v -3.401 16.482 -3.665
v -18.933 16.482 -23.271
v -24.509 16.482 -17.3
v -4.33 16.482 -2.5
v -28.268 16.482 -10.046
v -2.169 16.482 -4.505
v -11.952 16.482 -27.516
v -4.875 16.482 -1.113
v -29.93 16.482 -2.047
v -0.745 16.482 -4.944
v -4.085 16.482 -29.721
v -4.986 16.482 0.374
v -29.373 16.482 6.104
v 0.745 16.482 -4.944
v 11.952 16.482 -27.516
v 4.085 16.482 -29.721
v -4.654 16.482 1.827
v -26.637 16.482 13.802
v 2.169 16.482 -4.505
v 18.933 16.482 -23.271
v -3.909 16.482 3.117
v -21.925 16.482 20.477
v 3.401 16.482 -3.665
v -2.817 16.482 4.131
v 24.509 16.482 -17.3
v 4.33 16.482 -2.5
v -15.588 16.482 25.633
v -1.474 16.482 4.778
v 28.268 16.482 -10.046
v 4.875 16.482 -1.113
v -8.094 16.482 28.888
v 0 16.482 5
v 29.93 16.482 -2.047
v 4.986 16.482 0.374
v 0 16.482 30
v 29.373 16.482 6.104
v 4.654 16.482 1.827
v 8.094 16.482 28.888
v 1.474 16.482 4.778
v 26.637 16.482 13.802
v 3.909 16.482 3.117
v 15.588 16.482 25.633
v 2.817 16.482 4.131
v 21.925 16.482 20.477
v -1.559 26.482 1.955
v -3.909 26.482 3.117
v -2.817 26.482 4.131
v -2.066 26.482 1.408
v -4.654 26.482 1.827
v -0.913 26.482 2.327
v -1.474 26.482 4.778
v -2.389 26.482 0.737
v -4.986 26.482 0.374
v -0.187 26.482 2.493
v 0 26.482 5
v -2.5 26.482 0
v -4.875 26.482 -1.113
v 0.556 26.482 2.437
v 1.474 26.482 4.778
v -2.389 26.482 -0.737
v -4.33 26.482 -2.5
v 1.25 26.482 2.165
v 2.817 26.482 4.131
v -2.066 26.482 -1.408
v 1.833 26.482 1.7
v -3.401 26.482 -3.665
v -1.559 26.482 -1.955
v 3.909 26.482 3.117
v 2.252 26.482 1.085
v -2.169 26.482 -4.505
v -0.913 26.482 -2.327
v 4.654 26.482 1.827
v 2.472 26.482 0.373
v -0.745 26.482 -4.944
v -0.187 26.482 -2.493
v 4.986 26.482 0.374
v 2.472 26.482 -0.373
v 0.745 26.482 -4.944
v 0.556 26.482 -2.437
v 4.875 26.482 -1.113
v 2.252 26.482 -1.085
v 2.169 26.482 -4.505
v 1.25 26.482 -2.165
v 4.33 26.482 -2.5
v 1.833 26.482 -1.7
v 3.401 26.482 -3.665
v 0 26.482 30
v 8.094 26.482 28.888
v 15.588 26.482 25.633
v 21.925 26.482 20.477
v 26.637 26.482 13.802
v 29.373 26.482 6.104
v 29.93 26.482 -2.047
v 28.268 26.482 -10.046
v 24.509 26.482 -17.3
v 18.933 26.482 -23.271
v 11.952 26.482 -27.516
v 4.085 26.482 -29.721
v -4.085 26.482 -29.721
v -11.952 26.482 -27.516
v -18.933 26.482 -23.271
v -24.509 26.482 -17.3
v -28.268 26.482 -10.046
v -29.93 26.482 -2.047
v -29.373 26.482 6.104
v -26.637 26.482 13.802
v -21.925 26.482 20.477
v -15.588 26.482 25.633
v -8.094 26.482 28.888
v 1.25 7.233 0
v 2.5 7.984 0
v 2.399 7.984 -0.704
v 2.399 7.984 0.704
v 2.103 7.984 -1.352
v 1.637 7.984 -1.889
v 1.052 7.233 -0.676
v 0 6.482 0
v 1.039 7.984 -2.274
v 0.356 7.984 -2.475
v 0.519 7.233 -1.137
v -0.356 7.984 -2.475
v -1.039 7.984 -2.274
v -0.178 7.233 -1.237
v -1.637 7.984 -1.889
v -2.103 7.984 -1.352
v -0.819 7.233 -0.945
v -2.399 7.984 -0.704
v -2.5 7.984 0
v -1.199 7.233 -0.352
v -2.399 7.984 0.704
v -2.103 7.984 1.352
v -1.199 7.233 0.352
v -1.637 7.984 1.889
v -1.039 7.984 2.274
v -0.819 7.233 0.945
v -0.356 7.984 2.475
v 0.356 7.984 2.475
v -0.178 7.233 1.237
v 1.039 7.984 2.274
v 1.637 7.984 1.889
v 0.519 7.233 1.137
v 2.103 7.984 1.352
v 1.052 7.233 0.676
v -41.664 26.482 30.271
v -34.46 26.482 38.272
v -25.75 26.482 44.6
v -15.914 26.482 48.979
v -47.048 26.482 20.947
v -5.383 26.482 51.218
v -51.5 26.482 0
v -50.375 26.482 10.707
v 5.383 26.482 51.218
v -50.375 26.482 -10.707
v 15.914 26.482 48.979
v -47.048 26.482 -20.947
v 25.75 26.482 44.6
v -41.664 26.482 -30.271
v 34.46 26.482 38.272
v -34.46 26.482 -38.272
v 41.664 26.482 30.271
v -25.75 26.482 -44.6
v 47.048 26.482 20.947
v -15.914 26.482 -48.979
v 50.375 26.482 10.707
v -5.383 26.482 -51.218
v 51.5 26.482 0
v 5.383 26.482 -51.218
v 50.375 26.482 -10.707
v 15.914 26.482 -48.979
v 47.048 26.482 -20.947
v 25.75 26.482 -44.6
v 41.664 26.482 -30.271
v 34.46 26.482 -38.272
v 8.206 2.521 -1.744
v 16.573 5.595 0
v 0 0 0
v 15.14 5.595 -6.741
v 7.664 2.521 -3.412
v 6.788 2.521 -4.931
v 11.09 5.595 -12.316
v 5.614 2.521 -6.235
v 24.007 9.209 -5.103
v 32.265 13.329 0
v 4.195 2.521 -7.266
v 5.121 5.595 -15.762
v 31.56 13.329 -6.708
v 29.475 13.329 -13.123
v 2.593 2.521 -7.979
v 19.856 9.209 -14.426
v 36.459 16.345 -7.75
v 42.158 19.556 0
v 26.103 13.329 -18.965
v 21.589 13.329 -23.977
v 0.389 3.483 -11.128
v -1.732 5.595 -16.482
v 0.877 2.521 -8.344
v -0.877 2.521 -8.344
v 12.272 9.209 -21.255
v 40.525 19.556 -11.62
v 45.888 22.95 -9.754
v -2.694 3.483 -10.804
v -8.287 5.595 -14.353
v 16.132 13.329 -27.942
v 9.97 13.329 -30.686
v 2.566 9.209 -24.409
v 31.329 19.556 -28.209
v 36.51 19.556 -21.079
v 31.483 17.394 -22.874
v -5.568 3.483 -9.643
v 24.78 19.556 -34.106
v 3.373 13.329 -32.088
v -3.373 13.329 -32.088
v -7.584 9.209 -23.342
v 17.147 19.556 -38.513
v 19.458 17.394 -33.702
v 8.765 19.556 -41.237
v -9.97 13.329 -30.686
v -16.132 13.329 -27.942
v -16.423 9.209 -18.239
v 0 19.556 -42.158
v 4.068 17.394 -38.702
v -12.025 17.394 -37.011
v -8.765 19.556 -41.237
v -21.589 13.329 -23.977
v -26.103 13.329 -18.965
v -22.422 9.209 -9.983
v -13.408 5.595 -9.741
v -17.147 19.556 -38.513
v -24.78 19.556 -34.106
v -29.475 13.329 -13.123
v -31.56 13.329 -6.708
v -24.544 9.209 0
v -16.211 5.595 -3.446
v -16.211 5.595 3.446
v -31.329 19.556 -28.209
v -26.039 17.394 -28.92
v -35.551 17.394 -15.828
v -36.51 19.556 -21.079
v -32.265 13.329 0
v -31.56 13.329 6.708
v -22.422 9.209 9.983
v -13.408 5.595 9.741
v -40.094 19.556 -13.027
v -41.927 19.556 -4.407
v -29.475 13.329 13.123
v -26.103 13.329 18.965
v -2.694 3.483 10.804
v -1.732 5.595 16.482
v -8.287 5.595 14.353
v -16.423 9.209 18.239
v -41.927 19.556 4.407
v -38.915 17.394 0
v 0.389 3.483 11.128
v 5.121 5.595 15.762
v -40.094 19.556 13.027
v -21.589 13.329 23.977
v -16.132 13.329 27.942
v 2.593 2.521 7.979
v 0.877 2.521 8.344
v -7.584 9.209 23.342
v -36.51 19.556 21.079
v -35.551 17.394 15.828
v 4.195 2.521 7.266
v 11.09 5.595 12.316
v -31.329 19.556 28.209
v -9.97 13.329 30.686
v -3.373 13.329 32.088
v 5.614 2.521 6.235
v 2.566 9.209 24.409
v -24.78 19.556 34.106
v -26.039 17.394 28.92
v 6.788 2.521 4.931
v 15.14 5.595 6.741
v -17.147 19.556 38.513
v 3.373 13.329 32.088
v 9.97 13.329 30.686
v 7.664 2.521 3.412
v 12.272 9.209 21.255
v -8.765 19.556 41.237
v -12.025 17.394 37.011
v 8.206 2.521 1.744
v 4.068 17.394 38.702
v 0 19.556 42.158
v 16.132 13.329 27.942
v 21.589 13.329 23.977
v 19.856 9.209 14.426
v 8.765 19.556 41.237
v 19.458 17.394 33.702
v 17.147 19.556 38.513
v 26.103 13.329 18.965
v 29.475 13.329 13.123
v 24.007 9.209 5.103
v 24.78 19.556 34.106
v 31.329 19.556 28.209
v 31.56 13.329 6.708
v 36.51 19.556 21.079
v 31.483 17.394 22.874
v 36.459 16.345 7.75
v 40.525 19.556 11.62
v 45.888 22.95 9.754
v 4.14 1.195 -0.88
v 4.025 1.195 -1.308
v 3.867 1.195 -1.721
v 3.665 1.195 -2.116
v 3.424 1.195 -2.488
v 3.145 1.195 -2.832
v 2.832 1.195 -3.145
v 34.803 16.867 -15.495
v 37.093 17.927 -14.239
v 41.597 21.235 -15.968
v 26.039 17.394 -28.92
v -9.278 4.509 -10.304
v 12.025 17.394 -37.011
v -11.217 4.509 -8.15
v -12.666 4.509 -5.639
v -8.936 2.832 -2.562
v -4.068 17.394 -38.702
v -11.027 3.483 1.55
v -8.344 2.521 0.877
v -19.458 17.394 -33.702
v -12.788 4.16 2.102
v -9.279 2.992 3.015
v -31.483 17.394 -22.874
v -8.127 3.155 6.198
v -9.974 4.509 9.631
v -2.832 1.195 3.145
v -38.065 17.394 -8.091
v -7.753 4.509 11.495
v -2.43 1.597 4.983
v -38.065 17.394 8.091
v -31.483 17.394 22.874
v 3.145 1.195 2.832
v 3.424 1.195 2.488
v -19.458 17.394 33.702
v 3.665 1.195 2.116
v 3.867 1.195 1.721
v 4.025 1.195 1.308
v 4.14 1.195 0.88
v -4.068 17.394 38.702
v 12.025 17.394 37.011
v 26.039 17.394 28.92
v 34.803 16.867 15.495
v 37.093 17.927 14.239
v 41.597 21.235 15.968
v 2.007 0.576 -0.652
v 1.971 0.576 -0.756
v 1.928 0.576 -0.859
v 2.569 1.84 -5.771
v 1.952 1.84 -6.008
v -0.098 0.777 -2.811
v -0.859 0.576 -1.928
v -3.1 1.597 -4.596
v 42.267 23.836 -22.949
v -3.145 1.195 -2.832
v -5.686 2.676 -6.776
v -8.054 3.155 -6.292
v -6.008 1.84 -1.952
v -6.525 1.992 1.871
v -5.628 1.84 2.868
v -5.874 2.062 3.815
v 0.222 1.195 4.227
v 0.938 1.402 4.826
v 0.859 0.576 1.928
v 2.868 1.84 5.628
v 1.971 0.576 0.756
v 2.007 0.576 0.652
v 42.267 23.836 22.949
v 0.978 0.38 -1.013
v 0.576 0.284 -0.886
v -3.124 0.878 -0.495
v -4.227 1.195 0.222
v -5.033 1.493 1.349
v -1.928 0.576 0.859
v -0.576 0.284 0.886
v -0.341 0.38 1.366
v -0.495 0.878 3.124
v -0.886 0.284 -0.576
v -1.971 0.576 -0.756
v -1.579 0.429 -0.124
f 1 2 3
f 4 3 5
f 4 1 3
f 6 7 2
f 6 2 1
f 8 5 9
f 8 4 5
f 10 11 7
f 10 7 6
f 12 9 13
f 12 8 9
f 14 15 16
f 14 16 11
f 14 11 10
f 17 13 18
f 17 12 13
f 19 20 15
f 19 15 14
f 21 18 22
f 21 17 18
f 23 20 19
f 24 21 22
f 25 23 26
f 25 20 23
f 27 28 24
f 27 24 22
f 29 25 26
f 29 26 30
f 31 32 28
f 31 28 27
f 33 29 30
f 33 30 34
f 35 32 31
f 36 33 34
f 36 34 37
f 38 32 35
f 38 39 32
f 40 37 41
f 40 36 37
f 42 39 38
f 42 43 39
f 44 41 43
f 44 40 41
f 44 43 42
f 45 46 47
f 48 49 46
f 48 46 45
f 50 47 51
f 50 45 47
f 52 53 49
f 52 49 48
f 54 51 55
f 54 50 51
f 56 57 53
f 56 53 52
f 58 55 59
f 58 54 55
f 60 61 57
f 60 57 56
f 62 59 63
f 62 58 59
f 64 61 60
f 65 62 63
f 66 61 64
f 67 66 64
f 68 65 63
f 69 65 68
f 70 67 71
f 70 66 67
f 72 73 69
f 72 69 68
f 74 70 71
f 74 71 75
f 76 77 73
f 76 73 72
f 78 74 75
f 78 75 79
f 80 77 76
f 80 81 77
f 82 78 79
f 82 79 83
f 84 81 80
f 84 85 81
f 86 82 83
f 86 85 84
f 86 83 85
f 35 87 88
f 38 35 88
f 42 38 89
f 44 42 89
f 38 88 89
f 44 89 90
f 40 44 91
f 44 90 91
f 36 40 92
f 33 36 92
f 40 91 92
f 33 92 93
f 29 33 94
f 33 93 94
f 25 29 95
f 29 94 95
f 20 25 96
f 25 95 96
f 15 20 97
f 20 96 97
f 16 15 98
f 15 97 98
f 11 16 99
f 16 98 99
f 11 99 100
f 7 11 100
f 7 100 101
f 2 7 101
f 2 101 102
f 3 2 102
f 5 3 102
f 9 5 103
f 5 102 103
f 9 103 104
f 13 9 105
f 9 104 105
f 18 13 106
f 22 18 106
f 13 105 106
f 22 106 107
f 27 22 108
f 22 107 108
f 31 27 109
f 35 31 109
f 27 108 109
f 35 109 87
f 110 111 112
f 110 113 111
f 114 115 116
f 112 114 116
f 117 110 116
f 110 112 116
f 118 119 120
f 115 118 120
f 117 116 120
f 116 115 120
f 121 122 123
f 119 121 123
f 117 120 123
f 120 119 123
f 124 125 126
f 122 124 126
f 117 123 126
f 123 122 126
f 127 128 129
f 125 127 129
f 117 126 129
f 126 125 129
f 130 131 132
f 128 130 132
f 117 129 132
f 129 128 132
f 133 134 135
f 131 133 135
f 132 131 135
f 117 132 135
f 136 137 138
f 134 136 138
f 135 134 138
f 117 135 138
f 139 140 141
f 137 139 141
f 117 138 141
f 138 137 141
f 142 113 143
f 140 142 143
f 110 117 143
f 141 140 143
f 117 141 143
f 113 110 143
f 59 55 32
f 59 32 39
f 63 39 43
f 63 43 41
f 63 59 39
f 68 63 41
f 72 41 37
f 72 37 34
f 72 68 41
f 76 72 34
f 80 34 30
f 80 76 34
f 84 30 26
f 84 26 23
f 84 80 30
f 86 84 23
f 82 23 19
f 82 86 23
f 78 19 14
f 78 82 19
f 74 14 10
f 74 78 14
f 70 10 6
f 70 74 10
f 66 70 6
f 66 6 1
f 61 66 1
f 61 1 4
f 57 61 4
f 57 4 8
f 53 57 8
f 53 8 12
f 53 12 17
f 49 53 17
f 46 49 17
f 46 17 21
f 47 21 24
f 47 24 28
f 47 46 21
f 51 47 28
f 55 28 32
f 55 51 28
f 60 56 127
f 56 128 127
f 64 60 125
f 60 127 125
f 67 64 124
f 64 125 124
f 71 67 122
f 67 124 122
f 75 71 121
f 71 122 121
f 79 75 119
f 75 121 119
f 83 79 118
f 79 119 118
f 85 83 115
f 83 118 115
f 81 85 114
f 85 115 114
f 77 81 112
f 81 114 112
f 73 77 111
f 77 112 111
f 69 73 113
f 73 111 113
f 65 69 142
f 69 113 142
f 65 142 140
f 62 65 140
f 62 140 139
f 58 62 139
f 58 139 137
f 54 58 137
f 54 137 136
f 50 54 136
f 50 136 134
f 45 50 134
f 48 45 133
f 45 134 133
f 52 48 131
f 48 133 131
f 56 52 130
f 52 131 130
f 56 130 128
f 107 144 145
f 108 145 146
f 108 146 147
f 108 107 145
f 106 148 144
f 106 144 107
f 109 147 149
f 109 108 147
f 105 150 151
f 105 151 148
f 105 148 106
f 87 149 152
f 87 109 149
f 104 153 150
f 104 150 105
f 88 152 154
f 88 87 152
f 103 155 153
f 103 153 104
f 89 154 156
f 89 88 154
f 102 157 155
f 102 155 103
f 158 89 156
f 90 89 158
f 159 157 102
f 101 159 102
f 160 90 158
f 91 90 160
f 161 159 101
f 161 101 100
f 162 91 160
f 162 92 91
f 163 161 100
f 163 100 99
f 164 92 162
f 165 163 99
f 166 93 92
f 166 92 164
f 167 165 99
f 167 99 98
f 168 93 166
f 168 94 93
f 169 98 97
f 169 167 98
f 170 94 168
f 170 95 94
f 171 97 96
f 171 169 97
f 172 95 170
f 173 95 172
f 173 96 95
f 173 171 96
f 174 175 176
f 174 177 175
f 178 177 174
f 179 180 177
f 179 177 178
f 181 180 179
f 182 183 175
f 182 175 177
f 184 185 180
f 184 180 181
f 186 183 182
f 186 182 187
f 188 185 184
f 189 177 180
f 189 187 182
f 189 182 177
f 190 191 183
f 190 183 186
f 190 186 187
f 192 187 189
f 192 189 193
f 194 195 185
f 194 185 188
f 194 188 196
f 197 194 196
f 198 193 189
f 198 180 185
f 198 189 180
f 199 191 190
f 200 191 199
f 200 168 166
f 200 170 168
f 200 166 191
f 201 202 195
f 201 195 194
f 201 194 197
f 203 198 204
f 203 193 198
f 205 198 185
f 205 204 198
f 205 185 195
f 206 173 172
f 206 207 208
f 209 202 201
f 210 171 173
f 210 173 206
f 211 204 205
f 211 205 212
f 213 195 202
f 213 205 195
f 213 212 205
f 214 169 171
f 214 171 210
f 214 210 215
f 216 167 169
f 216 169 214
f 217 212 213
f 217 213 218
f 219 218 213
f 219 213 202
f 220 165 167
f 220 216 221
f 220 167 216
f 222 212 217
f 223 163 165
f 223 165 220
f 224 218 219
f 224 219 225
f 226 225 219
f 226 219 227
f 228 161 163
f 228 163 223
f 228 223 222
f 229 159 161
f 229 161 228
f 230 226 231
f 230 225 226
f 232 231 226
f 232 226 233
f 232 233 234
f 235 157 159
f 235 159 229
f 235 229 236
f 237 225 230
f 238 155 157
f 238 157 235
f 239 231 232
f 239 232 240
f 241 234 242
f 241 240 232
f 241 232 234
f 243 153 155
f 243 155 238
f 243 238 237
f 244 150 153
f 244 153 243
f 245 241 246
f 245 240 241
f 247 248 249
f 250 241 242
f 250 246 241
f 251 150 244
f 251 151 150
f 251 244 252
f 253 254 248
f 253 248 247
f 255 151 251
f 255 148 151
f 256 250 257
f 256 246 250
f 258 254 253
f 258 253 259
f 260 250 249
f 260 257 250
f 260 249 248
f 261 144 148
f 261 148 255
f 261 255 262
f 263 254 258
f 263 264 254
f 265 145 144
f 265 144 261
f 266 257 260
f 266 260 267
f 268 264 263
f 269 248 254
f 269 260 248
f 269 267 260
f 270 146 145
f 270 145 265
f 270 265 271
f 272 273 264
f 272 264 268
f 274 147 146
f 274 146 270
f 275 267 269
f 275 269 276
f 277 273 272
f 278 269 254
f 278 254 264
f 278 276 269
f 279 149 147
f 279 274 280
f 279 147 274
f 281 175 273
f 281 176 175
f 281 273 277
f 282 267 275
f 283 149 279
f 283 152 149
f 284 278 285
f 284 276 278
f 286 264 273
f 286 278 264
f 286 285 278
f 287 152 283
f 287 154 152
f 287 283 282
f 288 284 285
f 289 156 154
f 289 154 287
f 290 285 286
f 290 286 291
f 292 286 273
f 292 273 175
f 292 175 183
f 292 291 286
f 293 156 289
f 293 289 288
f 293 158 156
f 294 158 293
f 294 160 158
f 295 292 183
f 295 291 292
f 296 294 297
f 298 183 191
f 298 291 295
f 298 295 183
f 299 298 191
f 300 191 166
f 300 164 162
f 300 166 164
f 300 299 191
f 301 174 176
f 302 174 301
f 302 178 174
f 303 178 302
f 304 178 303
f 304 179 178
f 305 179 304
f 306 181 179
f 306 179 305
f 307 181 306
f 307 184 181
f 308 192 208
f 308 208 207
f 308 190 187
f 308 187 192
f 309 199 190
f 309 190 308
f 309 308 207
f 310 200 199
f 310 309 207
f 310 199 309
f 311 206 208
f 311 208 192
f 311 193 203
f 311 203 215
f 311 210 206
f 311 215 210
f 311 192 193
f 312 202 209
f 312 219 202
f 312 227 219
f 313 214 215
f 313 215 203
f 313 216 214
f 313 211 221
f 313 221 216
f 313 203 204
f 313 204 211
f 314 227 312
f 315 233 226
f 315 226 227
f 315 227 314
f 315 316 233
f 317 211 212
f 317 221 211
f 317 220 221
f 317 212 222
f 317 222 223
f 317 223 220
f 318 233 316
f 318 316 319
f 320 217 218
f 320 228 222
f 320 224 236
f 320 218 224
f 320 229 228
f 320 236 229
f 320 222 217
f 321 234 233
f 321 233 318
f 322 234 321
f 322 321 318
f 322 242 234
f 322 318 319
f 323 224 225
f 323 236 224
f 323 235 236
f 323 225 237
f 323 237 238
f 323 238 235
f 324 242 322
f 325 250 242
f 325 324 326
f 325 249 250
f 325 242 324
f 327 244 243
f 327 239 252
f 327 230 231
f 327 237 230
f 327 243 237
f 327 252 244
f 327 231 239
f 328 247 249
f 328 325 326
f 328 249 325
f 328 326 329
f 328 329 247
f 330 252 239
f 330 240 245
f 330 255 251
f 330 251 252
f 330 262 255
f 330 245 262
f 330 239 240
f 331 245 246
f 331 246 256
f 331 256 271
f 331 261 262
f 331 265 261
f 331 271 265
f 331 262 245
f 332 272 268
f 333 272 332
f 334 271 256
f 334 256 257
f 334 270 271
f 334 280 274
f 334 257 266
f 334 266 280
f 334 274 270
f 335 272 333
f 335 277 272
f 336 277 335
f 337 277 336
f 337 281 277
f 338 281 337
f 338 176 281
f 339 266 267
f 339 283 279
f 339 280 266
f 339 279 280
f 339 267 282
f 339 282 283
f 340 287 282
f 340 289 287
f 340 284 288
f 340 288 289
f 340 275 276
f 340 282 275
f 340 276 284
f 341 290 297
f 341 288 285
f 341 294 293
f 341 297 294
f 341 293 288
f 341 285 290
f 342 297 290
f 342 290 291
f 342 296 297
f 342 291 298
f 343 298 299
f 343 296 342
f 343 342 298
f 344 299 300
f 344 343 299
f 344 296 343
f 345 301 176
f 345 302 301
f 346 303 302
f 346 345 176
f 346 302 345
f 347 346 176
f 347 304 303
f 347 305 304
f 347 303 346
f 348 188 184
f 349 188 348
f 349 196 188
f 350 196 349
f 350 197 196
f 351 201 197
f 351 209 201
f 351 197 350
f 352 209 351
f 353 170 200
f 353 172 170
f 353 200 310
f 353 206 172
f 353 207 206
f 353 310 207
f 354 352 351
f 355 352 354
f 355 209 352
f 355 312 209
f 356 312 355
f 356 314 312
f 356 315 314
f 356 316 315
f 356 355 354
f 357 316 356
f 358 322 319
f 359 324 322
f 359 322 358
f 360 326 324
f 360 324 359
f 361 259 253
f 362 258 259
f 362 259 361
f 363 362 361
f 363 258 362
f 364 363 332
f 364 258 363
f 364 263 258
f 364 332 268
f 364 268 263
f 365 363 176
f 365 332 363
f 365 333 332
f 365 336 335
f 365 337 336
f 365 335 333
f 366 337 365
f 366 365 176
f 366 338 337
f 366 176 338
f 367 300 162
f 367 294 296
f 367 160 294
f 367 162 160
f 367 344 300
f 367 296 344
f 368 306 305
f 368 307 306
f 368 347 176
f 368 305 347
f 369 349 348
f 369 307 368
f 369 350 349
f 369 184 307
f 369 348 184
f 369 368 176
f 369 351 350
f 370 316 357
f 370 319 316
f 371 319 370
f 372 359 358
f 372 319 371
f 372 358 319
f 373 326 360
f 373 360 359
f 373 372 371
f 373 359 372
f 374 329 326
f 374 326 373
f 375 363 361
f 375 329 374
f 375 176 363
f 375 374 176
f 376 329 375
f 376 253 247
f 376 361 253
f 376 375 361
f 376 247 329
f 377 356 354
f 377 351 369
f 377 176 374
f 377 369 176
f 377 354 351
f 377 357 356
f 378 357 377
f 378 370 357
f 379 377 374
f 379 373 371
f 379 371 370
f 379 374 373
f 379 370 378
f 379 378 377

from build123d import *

# Parameters (mm, degrees)
SKETCH_3_R            = 30
SKETCH_3_R_2          = 5
CUT_EXTRUDE_2_DEPTH   = 10
HOLE_WIZARD_M61_D     = 5
HOLE_WIZARD_M61_DEPTH = 18.497848452
HOLE_WIZARD_M61_TIP   = 1.502151548


# Read off the part's stored shape, not the designer's step: Повернуть1
with BuildPart() as part:
    # Повернуть1 outline → Повернуть1 (revolve)
    with BuildSketch(Plane.XY):
        with BuildLine():
            Line((51.5, 26.48165559), (0, 26.48165559))
            Line((0, 26.48165559), (0, 0))
            add(Edge.make_bspline(
                [(0, 0), (0.156539895, 0.04133193), (0.469530076, 0.124531455), (1.095511669, 0.293183386), (1.873554951, 0.508331121), (2.649123351, 0.72837407), (3.423412252, 0.953638071), (4.013733879, 1.128266984), (4.844912611, 1.379694221), (5.317842465, 1.525671383), (6.509276852, 1.898728563), (7.243327053, 2.140034066), (8.307207562, 2.490567159), (9.181175291, 2.790749017), (10.392512094, 3.212408176), (11.533241177, 3.625618199), (12.713980503, 4.064307324), (13.864030789, 4.506730701), (14.793237788, 4.871354824), (15.943087068, 5.333377234), (17.321790678, 5.90311205), (18.91905871, 6.587105086), (20.734253685, 7.396581431), (22.536340181, 8.232758503), (24.326293905, 9.095556138), (26.103269747, 9.984556153), (27.867020214, 10.899103073), (29.617801935, 11.839314226), (31.60461842, 12.942813624), (33.574135616, 14.080801884), (35.521819214, 15.249061859), (37.454629603, 16.452505613), (39.122688535, 17.521509213), (41.203774914, 18.896658569), (43.236844805, 20.2890197), (45.285661909, 21.748137101), (47.248723401, 23.192176829), (48.69894305, 24.290874197), (49.764977395, 25.111263846), (50.815325911, 25.937355121), (51.180281148, 26.226459124), (51.421791087, 26.419144579), (51.5, 26.48165559)],
                knots=[0, 0, 0, 0, 0, 0.010253591, 0.020507182, 0.041014364, 0.051142143, 0.061269922, 0.071397702, 0.081525481, 0.097247494, 0.112969508, 0.128691521, 0.144413535, 0.160135548, 0.175857562, 0.207301586, 0.223023601, 0.238745616, 0.254467629, 0.270189641, 0.301633667, 0.333077698, 0.364521719, 0.395965752, 0.427409779, 0.458853799, 0.490297837, 0.521741856, 0.553185882, 0.60276153, 0.634205558, 0.665649585, 0.697093613, 0.728537641, 0.791425689, 0.822869716, 0.854313743, 0.885757777, 0.901479794, 0.91720181, 0.92423633, 0.92423633, 0.92423633, 0.92423633, 0.92423633], degree=4))
        make_face()
    revolve(axis=Axis((0, 0, 0), (0, 1, 0)))

    # Эскиз3 → Вырез-Вытянуть2 (cut)
    with BuildSketch(Plane(origin=(0, 26.48165559, 0), x_dir=(1, 0, 0), z_dir=(0, 1, 0))):
        with Locations(Location((0, 0, 0), (0, 0, 270))):
            Circle(SKETCH_3_R)
        with Locations(Location((0, 0, 0), (0, 0, 270))):
            Circle(SKETCH_3_R_2, mode=Mode.SUBTRACT)
    extrude(amount=-CUT_EXTRUDE_2_DEPTH, mode=Mode.SUBTRACT)

    # Отверстие обработанное метчиком M61
    with Locations(Plane(origin=(0, 26.48165559, 0), x_dir=(1, 0, 0), z_dir=(0, 1, 0))):
        with Locations((0, 0)):
            Hole(HOLE_WIZARD_M61_D / 2, depth=HOLE_WIZARD_M61_DEPTH)
            with Locations((0, 0, -(HOLE_WIZARD_M61_DEPTH + HOLE_WIZARD_M61_TIP / 2))):  # 118° drill point
                Cone(0, HOLE_WIZARD_M61_D / 2, HOLE_WIZARD_M61_TIP, mode=Mode.SUBTRACT)


solid = part.part
